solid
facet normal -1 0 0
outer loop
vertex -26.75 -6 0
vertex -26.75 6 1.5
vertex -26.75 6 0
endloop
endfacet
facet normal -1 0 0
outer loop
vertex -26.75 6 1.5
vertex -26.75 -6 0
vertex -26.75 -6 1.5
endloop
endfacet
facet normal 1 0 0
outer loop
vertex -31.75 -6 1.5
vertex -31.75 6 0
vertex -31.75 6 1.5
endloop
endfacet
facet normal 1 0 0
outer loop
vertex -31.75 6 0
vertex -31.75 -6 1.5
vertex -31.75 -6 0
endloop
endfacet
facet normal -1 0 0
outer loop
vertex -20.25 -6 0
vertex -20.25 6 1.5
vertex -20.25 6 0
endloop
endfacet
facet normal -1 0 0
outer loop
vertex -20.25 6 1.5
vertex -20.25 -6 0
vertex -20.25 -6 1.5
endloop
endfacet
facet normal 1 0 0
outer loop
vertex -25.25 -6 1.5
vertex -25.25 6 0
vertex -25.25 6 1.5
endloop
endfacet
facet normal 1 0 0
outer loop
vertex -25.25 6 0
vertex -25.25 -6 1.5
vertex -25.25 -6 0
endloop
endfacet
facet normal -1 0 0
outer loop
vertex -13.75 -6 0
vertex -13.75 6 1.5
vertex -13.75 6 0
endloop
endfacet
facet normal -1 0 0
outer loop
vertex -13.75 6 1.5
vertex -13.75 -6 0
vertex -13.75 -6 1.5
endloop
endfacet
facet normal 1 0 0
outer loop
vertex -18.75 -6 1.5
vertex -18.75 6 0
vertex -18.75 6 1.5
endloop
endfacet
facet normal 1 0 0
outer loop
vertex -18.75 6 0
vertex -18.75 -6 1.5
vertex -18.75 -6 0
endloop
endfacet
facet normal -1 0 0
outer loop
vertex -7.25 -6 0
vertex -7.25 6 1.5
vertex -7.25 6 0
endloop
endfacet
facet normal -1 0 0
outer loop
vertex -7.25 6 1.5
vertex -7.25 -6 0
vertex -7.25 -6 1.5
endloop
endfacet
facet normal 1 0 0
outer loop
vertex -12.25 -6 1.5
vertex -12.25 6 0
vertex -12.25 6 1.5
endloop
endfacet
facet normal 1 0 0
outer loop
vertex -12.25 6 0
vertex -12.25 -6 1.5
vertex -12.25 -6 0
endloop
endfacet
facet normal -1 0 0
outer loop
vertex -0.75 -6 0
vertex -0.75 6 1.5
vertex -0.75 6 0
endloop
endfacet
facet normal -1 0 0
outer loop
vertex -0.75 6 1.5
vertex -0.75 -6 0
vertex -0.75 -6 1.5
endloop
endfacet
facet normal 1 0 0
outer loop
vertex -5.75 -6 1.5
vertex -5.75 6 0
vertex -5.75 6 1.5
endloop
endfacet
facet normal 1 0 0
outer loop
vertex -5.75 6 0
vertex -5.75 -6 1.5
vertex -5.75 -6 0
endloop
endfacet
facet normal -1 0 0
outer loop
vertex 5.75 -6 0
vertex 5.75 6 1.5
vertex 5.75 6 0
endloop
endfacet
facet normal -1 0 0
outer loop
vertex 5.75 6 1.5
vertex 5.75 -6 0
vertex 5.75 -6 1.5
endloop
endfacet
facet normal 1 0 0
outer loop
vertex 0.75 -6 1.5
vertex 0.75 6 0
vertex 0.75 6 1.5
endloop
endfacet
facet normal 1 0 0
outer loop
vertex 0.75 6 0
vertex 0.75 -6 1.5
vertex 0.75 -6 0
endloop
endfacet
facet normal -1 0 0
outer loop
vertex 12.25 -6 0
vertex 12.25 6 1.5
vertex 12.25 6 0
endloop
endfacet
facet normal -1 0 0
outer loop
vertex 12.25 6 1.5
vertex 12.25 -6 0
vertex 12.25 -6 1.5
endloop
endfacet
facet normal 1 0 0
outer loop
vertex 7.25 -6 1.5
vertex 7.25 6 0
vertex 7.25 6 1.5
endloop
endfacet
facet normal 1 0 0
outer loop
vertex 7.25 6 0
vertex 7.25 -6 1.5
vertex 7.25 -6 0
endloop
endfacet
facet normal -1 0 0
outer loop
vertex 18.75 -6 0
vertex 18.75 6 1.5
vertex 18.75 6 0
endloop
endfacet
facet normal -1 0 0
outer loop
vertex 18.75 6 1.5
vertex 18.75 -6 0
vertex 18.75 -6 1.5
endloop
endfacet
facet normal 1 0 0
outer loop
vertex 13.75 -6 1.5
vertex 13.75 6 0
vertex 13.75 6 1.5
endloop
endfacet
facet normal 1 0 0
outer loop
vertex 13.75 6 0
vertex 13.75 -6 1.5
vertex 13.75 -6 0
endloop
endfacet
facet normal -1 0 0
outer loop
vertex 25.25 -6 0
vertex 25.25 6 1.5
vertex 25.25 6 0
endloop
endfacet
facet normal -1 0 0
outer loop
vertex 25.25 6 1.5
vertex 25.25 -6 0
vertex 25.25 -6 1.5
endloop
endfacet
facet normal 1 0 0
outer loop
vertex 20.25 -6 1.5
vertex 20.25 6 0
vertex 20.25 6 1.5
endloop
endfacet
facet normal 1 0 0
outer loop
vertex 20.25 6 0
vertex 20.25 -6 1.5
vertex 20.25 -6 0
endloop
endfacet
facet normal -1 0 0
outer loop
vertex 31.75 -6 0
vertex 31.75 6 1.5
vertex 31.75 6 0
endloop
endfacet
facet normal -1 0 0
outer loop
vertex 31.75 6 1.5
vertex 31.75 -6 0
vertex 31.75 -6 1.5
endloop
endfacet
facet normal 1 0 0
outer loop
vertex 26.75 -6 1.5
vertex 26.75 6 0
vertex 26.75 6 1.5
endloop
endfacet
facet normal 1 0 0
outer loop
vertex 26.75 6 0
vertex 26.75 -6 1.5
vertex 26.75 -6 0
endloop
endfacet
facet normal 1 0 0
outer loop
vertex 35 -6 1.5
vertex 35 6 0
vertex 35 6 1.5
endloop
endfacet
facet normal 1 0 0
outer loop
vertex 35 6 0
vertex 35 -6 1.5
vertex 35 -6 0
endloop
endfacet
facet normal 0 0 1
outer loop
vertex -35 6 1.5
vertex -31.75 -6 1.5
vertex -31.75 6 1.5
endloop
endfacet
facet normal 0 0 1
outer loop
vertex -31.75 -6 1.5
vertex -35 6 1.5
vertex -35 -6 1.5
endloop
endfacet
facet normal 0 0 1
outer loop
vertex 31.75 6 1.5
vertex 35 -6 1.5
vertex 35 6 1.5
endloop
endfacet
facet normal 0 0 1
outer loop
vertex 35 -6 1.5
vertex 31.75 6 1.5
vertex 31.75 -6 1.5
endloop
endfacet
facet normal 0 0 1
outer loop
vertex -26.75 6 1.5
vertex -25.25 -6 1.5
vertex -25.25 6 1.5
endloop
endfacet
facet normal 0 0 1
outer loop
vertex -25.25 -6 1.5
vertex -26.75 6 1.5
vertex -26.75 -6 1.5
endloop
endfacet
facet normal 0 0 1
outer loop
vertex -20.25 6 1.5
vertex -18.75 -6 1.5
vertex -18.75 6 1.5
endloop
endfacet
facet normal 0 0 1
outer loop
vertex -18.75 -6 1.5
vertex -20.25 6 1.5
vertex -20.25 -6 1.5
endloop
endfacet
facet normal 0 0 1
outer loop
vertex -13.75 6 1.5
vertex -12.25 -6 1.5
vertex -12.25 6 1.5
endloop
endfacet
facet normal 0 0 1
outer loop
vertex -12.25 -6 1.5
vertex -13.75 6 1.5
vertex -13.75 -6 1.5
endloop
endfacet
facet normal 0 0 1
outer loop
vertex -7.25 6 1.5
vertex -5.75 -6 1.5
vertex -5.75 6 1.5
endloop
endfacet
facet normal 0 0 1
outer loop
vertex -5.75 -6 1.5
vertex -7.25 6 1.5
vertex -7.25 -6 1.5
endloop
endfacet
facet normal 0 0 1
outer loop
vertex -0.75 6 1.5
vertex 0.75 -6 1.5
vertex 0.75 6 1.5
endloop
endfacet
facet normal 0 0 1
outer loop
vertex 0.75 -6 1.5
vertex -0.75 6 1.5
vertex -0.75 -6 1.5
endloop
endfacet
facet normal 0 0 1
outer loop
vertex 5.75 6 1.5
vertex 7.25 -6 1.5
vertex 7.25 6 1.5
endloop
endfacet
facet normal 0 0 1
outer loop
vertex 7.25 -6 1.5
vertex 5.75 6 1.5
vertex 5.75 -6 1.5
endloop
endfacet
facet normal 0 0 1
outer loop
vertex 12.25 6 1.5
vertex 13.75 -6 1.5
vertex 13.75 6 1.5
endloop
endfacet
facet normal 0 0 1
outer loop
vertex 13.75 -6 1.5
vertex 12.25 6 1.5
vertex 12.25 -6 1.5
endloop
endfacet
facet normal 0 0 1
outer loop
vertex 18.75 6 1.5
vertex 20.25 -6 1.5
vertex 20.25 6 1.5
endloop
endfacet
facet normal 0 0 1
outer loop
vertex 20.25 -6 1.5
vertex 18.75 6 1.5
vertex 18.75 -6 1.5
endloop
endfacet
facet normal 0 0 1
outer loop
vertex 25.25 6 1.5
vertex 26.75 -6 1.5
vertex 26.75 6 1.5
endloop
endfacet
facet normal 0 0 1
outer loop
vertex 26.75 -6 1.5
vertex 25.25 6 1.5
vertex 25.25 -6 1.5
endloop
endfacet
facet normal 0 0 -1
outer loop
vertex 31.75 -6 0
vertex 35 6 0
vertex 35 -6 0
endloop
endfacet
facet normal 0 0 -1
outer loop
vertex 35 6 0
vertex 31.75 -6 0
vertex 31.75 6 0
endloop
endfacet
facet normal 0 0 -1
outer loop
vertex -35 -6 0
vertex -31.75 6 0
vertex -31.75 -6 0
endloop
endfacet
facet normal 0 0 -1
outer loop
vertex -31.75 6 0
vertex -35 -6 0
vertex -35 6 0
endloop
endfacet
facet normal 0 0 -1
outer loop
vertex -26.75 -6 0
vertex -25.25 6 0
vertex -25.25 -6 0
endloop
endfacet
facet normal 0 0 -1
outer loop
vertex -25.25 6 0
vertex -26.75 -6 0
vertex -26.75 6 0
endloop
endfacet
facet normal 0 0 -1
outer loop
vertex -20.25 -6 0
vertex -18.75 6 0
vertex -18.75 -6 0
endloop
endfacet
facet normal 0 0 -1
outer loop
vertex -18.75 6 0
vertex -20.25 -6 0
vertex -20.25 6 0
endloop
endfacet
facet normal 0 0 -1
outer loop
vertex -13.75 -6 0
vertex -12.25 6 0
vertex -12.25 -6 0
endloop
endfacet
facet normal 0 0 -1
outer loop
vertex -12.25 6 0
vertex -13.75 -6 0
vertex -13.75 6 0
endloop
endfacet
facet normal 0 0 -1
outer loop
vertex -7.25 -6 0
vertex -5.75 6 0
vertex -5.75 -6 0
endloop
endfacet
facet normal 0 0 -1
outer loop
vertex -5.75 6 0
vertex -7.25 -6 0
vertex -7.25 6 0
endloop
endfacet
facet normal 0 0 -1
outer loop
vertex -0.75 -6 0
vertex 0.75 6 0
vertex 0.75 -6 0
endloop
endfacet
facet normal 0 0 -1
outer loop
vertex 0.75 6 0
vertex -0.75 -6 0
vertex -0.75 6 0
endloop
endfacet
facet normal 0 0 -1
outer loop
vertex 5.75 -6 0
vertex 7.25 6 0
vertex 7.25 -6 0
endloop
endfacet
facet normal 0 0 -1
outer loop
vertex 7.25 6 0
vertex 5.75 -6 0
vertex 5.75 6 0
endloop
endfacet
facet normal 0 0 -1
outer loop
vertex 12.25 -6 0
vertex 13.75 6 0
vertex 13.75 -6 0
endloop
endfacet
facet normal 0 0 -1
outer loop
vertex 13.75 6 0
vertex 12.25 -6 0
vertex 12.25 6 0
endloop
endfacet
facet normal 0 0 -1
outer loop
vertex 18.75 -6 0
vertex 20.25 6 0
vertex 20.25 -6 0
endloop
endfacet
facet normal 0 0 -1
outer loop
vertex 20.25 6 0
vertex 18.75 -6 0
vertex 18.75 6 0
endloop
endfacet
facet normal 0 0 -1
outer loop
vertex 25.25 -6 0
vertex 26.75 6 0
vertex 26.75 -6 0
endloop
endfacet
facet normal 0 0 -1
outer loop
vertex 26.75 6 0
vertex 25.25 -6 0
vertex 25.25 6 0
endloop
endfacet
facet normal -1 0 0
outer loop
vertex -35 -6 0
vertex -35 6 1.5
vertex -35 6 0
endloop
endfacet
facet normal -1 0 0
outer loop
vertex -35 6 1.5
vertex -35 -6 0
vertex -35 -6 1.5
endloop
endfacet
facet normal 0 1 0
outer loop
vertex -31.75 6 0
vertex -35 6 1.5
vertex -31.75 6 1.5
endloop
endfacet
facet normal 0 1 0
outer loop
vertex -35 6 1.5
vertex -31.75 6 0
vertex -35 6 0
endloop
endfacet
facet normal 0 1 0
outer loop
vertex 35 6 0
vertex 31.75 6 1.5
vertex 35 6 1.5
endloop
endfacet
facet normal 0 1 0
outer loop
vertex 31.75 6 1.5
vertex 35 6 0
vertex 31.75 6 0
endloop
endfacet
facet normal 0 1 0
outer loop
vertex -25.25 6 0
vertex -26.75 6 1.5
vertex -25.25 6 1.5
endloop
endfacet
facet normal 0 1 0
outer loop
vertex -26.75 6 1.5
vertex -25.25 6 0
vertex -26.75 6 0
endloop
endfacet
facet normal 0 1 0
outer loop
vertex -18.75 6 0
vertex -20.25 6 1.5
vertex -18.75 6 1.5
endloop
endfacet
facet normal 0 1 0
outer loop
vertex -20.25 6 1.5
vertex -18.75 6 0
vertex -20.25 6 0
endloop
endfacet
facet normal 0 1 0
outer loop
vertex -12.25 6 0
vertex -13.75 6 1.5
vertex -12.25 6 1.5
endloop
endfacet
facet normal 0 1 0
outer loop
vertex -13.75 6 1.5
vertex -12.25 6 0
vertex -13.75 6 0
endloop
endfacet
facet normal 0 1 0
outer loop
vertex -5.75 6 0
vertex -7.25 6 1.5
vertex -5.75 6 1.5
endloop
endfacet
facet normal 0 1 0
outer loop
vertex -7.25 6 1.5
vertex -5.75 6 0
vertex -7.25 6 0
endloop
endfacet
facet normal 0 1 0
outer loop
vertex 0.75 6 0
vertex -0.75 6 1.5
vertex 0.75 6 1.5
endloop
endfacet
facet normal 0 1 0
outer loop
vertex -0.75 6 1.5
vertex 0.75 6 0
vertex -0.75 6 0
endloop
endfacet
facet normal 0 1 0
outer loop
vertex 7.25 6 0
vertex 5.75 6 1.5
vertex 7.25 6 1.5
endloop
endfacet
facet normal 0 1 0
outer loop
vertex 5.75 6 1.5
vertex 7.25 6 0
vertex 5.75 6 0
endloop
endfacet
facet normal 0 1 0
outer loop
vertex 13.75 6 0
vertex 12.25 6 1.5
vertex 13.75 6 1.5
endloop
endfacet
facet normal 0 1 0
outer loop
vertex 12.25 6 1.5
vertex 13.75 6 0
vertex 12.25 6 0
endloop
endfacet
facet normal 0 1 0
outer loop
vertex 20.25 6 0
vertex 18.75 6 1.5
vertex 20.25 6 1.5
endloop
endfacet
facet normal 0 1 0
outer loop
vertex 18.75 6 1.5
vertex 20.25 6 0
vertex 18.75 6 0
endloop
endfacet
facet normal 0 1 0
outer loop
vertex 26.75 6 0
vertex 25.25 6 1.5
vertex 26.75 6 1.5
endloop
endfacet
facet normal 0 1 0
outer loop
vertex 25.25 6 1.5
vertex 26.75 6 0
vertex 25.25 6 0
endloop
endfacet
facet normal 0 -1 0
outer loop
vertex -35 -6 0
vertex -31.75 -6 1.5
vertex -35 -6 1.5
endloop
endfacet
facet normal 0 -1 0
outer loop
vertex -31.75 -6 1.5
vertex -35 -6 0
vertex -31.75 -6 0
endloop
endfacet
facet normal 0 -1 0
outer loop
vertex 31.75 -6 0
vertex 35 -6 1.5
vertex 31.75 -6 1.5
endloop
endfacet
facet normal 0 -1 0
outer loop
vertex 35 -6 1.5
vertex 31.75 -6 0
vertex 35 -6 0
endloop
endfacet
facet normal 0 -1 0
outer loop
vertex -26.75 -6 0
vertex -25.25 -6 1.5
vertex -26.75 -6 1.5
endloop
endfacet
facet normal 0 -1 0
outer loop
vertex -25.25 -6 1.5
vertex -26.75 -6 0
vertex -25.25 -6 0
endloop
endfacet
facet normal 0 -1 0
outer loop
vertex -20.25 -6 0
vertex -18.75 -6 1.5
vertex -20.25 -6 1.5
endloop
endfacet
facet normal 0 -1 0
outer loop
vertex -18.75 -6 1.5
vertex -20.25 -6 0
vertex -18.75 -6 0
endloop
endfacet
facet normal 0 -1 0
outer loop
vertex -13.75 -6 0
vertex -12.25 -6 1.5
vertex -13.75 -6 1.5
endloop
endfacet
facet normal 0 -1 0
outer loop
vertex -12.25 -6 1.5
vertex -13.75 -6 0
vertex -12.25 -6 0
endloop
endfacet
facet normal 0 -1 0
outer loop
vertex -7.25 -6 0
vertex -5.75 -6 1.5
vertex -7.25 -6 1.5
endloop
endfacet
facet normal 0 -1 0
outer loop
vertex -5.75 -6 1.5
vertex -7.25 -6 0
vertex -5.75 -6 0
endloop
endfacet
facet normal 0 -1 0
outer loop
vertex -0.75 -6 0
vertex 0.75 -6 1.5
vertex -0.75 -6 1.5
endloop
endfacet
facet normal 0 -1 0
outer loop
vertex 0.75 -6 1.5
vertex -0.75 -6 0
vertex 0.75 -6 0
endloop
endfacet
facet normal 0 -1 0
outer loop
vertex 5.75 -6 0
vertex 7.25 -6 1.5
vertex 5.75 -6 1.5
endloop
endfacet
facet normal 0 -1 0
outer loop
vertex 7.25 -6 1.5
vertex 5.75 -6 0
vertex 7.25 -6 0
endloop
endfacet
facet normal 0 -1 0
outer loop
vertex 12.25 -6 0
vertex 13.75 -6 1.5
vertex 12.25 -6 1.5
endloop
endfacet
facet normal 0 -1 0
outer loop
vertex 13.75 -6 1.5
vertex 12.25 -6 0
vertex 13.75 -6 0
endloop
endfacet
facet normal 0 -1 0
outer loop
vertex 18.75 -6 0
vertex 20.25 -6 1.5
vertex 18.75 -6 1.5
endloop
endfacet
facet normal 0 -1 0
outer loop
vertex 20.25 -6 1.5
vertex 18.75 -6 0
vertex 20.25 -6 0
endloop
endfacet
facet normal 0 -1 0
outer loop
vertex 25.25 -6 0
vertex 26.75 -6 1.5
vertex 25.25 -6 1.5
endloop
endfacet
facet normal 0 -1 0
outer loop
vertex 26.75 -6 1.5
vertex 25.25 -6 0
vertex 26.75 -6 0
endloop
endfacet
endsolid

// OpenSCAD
// 10-well comb for agarose gel casting
// Printed lying flat on the bed

num_wells   = 10;    // number of wells
plate_w     = 70;    // plate length (X)
plate_d     = 12;    // plate width (Y)
well_w      = 5;     // well width (X)
well_l      = 12;    // well length (Y)
gap         = 1.5;   // gap between wells (X)
thickness   = 1.5;   // plate thickness (Z)
overcut     = 0.5;   // extra length for clean cuts (X)

$fn = 64;

pitch = well_w + gap;  // 6.5 mm

difference() {
    // Base plate
    translate([-plate_w/2, -plate_d/2, 0])
        cube([plate_w, plate_d, thickness]);

    // Wells, centred on plate in X
    for (i = [0 : num_wells - 1])
        translate([(i - (num_wells - 1)/2) * pitch - well_w/2,
                   -plate_d/2 - overcut,
                   -overcut])
            cube([well_w, well_l + 2*overcut, thickness + 2*overcut]);
}
